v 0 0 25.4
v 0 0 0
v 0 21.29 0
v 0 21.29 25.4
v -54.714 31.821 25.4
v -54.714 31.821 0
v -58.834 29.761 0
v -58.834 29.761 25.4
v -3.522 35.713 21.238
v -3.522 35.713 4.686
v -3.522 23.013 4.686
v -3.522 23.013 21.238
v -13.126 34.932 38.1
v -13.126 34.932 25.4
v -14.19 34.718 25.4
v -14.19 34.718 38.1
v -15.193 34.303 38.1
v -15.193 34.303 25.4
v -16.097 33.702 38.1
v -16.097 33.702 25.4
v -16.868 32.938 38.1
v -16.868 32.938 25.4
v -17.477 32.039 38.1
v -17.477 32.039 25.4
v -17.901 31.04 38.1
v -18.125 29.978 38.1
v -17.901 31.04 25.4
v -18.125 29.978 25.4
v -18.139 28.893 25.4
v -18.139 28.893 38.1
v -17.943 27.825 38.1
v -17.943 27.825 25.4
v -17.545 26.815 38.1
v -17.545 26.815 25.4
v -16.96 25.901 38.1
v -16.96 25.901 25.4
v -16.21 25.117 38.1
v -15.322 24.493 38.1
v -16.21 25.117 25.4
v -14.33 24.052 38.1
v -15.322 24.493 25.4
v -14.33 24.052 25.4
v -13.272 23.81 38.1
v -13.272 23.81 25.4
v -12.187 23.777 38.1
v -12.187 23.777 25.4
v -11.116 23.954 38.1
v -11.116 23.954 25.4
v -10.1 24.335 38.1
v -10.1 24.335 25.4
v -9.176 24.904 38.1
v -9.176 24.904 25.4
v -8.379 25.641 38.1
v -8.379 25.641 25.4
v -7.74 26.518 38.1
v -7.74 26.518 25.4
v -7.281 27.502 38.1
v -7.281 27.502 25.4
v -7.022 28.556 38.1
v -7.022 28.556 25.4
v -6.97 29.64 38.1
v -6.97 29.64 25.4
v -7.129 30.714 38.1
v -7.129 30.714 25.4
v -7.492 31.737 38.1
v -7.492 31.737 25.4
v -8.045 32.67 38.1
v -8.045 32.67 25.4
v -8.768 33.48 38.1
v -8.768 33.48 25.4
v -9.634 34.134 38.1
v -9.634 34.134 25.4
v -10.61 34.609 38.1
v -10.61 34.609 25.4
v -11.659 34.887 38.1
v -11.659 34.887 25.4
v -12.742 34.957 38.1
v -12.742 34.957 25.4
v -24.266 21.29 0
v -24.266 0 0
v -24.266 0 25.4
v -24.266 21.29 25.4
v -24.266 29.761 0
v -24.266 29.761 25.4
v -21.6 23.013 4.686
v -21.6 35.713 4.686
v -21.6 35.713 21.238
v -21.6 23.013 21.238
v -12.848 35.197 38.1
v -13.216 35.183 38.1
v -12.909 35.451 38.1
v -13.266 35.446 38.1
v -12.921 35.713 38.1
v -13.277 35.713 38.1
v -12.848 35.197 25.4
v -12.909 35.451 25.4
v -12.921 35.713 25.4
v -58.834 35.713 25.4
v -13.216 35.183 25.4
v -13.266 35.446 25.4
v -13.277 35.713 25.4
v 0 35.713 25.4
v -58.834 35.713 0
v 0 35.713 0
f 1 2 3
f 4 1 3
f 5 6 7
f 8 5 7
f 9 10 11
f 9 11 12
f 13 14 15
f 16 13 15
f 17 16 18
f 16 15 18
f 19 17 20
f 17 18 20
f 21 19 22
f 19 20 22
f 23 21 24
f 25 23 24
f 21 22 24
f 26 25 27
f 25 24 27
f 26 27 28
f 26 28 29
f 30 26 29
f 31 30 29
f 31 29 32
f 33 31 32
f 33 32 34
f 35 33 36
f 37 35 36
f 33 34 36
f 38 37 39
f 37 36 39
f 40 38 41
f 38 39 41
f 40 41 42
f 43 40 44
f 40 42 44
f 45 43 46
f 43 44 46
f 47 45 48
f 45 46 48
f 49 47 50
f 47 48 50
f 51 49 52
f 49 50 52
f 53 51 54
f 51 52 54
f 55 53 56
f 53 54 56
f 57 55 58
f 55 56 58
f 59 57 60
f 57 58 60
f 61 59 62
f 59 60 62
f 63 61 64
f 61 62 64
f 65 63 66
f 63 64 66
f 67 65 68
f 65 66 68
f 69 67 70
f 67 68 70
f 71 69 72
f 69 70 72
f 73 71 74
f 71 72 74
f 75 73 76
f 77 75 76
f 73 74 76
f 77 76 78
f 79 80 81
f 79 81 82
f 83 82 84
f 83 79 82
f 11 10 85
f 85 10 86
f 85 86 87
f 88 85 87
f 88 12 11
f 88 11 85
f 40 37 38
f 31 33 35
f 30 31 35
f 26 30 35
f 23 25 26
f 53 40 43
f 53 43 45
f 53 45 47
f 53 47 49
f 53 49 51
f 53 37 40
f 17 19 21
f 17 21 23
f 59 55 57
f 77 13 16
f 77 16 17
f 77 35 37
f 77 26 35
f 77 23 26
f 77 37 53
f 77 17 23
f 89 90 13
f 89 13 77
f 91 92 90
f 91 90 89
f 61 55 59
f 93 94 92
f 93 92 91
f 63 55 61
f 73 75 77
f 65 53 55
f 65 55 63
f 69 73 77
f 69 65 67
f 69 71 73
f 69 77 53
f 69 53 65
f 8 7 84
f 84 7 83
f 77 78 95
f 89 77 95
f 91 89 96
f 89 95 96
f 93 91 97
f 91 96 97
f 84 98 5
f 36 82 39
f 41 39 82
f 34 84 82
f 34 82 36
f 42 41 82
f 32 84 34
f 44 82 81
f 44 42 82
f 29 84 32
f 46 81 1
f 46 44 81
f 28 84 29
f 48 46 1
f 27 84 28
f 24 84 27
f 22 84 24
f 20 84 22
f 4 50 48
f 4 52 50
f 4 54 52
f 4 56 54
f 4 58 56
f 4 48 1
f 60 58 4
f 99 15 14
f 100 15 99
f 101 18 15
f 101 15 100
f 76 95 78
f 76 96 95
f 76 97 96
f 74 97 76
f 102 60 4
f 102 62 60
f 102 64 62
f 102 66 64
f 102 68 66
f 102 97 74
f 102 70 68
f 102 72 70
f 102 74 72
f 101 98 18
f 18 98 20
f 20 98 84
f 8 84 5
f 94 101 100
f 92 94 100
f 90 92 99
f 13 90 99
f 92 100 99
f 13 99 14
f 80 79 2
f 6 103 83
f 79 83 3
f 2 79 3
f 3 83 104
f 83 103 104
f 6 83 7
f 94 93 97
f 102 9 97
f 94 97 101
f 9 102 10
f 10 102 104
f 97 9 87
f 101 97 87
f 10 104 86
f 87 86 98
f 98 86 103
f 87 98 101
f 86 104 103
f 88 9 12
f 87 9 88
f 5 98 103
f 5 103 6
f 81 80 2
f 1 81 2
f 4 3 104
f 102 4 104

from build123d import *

# Parameters (mm, degrees)
F0_W     = 24.2662671953
F0_H     = 21.2902147323
F1_DEPTH = 25.4
F2_W     = 18.0781867821
F2_H     = 16.5515192784
F3_DEPTH = 12.7
F5_DEPTH = 12.7


with BuildPart() as f1:
    # F0 (on Top) → F1 (new body)
    with BuildSketch(Plane.XY):
        with Locations((-12.1331335977, 10.6451073661)):
            Rectangle(F0_W, F0_H)
        Polygon((-24.2662671953, 21.2902147323), (0, 21.2902147323), (0, 34.7969122231), (0, 35.7126183808), (-58.8342510164, 35.7126183808), (-54.7135621309, 31.82085976), (-58.8342510164, 29.76051718), (-24.2662671953, 29.76051718), align=None)
    extrude(amount=F1_DEPTH)

    # F2 (on face) → F3 (cut)
    with BuildSketch(Plane(origin=(0, 35.7126183808, 0), x_dir=(-1, 0, 0), z_dir=(0, 1, 0))):
        with Locations((12.5608363887, 12.9621129017)):
            Rectangle(F2_W, F2_H)
    extrude(amount=-F3_DEPTH, mode=Mode.SUBTRACT)

    # F4 (on face) → F5 (join)
    with BuildSketch(Plane.XY.offset(25.4)):
        with BuildLine():
            Line((-12.9212626108, 35.7126183808), (-13.2771370955, 35.7126183808))
            ThreePointArc((-13.2771370955, 35.7126183808), (-13.246046568, 35.3136187013), (-13.1263993339, 34.9317130788))
            ThreePointArc((-13.1263993339, 34.9317130788), (-12.1871466245, 23.7773669845), (-12.7422108084, 34.9574177981))
            ThreePointArc((-12.7422108084, 34.9574177981), (-12.8843245269, 35.3225499536), (-12.9212626108, 35.7126183808))
        make_face()
    extrude(amount=F5_DEPTH)


solid = f1.part
